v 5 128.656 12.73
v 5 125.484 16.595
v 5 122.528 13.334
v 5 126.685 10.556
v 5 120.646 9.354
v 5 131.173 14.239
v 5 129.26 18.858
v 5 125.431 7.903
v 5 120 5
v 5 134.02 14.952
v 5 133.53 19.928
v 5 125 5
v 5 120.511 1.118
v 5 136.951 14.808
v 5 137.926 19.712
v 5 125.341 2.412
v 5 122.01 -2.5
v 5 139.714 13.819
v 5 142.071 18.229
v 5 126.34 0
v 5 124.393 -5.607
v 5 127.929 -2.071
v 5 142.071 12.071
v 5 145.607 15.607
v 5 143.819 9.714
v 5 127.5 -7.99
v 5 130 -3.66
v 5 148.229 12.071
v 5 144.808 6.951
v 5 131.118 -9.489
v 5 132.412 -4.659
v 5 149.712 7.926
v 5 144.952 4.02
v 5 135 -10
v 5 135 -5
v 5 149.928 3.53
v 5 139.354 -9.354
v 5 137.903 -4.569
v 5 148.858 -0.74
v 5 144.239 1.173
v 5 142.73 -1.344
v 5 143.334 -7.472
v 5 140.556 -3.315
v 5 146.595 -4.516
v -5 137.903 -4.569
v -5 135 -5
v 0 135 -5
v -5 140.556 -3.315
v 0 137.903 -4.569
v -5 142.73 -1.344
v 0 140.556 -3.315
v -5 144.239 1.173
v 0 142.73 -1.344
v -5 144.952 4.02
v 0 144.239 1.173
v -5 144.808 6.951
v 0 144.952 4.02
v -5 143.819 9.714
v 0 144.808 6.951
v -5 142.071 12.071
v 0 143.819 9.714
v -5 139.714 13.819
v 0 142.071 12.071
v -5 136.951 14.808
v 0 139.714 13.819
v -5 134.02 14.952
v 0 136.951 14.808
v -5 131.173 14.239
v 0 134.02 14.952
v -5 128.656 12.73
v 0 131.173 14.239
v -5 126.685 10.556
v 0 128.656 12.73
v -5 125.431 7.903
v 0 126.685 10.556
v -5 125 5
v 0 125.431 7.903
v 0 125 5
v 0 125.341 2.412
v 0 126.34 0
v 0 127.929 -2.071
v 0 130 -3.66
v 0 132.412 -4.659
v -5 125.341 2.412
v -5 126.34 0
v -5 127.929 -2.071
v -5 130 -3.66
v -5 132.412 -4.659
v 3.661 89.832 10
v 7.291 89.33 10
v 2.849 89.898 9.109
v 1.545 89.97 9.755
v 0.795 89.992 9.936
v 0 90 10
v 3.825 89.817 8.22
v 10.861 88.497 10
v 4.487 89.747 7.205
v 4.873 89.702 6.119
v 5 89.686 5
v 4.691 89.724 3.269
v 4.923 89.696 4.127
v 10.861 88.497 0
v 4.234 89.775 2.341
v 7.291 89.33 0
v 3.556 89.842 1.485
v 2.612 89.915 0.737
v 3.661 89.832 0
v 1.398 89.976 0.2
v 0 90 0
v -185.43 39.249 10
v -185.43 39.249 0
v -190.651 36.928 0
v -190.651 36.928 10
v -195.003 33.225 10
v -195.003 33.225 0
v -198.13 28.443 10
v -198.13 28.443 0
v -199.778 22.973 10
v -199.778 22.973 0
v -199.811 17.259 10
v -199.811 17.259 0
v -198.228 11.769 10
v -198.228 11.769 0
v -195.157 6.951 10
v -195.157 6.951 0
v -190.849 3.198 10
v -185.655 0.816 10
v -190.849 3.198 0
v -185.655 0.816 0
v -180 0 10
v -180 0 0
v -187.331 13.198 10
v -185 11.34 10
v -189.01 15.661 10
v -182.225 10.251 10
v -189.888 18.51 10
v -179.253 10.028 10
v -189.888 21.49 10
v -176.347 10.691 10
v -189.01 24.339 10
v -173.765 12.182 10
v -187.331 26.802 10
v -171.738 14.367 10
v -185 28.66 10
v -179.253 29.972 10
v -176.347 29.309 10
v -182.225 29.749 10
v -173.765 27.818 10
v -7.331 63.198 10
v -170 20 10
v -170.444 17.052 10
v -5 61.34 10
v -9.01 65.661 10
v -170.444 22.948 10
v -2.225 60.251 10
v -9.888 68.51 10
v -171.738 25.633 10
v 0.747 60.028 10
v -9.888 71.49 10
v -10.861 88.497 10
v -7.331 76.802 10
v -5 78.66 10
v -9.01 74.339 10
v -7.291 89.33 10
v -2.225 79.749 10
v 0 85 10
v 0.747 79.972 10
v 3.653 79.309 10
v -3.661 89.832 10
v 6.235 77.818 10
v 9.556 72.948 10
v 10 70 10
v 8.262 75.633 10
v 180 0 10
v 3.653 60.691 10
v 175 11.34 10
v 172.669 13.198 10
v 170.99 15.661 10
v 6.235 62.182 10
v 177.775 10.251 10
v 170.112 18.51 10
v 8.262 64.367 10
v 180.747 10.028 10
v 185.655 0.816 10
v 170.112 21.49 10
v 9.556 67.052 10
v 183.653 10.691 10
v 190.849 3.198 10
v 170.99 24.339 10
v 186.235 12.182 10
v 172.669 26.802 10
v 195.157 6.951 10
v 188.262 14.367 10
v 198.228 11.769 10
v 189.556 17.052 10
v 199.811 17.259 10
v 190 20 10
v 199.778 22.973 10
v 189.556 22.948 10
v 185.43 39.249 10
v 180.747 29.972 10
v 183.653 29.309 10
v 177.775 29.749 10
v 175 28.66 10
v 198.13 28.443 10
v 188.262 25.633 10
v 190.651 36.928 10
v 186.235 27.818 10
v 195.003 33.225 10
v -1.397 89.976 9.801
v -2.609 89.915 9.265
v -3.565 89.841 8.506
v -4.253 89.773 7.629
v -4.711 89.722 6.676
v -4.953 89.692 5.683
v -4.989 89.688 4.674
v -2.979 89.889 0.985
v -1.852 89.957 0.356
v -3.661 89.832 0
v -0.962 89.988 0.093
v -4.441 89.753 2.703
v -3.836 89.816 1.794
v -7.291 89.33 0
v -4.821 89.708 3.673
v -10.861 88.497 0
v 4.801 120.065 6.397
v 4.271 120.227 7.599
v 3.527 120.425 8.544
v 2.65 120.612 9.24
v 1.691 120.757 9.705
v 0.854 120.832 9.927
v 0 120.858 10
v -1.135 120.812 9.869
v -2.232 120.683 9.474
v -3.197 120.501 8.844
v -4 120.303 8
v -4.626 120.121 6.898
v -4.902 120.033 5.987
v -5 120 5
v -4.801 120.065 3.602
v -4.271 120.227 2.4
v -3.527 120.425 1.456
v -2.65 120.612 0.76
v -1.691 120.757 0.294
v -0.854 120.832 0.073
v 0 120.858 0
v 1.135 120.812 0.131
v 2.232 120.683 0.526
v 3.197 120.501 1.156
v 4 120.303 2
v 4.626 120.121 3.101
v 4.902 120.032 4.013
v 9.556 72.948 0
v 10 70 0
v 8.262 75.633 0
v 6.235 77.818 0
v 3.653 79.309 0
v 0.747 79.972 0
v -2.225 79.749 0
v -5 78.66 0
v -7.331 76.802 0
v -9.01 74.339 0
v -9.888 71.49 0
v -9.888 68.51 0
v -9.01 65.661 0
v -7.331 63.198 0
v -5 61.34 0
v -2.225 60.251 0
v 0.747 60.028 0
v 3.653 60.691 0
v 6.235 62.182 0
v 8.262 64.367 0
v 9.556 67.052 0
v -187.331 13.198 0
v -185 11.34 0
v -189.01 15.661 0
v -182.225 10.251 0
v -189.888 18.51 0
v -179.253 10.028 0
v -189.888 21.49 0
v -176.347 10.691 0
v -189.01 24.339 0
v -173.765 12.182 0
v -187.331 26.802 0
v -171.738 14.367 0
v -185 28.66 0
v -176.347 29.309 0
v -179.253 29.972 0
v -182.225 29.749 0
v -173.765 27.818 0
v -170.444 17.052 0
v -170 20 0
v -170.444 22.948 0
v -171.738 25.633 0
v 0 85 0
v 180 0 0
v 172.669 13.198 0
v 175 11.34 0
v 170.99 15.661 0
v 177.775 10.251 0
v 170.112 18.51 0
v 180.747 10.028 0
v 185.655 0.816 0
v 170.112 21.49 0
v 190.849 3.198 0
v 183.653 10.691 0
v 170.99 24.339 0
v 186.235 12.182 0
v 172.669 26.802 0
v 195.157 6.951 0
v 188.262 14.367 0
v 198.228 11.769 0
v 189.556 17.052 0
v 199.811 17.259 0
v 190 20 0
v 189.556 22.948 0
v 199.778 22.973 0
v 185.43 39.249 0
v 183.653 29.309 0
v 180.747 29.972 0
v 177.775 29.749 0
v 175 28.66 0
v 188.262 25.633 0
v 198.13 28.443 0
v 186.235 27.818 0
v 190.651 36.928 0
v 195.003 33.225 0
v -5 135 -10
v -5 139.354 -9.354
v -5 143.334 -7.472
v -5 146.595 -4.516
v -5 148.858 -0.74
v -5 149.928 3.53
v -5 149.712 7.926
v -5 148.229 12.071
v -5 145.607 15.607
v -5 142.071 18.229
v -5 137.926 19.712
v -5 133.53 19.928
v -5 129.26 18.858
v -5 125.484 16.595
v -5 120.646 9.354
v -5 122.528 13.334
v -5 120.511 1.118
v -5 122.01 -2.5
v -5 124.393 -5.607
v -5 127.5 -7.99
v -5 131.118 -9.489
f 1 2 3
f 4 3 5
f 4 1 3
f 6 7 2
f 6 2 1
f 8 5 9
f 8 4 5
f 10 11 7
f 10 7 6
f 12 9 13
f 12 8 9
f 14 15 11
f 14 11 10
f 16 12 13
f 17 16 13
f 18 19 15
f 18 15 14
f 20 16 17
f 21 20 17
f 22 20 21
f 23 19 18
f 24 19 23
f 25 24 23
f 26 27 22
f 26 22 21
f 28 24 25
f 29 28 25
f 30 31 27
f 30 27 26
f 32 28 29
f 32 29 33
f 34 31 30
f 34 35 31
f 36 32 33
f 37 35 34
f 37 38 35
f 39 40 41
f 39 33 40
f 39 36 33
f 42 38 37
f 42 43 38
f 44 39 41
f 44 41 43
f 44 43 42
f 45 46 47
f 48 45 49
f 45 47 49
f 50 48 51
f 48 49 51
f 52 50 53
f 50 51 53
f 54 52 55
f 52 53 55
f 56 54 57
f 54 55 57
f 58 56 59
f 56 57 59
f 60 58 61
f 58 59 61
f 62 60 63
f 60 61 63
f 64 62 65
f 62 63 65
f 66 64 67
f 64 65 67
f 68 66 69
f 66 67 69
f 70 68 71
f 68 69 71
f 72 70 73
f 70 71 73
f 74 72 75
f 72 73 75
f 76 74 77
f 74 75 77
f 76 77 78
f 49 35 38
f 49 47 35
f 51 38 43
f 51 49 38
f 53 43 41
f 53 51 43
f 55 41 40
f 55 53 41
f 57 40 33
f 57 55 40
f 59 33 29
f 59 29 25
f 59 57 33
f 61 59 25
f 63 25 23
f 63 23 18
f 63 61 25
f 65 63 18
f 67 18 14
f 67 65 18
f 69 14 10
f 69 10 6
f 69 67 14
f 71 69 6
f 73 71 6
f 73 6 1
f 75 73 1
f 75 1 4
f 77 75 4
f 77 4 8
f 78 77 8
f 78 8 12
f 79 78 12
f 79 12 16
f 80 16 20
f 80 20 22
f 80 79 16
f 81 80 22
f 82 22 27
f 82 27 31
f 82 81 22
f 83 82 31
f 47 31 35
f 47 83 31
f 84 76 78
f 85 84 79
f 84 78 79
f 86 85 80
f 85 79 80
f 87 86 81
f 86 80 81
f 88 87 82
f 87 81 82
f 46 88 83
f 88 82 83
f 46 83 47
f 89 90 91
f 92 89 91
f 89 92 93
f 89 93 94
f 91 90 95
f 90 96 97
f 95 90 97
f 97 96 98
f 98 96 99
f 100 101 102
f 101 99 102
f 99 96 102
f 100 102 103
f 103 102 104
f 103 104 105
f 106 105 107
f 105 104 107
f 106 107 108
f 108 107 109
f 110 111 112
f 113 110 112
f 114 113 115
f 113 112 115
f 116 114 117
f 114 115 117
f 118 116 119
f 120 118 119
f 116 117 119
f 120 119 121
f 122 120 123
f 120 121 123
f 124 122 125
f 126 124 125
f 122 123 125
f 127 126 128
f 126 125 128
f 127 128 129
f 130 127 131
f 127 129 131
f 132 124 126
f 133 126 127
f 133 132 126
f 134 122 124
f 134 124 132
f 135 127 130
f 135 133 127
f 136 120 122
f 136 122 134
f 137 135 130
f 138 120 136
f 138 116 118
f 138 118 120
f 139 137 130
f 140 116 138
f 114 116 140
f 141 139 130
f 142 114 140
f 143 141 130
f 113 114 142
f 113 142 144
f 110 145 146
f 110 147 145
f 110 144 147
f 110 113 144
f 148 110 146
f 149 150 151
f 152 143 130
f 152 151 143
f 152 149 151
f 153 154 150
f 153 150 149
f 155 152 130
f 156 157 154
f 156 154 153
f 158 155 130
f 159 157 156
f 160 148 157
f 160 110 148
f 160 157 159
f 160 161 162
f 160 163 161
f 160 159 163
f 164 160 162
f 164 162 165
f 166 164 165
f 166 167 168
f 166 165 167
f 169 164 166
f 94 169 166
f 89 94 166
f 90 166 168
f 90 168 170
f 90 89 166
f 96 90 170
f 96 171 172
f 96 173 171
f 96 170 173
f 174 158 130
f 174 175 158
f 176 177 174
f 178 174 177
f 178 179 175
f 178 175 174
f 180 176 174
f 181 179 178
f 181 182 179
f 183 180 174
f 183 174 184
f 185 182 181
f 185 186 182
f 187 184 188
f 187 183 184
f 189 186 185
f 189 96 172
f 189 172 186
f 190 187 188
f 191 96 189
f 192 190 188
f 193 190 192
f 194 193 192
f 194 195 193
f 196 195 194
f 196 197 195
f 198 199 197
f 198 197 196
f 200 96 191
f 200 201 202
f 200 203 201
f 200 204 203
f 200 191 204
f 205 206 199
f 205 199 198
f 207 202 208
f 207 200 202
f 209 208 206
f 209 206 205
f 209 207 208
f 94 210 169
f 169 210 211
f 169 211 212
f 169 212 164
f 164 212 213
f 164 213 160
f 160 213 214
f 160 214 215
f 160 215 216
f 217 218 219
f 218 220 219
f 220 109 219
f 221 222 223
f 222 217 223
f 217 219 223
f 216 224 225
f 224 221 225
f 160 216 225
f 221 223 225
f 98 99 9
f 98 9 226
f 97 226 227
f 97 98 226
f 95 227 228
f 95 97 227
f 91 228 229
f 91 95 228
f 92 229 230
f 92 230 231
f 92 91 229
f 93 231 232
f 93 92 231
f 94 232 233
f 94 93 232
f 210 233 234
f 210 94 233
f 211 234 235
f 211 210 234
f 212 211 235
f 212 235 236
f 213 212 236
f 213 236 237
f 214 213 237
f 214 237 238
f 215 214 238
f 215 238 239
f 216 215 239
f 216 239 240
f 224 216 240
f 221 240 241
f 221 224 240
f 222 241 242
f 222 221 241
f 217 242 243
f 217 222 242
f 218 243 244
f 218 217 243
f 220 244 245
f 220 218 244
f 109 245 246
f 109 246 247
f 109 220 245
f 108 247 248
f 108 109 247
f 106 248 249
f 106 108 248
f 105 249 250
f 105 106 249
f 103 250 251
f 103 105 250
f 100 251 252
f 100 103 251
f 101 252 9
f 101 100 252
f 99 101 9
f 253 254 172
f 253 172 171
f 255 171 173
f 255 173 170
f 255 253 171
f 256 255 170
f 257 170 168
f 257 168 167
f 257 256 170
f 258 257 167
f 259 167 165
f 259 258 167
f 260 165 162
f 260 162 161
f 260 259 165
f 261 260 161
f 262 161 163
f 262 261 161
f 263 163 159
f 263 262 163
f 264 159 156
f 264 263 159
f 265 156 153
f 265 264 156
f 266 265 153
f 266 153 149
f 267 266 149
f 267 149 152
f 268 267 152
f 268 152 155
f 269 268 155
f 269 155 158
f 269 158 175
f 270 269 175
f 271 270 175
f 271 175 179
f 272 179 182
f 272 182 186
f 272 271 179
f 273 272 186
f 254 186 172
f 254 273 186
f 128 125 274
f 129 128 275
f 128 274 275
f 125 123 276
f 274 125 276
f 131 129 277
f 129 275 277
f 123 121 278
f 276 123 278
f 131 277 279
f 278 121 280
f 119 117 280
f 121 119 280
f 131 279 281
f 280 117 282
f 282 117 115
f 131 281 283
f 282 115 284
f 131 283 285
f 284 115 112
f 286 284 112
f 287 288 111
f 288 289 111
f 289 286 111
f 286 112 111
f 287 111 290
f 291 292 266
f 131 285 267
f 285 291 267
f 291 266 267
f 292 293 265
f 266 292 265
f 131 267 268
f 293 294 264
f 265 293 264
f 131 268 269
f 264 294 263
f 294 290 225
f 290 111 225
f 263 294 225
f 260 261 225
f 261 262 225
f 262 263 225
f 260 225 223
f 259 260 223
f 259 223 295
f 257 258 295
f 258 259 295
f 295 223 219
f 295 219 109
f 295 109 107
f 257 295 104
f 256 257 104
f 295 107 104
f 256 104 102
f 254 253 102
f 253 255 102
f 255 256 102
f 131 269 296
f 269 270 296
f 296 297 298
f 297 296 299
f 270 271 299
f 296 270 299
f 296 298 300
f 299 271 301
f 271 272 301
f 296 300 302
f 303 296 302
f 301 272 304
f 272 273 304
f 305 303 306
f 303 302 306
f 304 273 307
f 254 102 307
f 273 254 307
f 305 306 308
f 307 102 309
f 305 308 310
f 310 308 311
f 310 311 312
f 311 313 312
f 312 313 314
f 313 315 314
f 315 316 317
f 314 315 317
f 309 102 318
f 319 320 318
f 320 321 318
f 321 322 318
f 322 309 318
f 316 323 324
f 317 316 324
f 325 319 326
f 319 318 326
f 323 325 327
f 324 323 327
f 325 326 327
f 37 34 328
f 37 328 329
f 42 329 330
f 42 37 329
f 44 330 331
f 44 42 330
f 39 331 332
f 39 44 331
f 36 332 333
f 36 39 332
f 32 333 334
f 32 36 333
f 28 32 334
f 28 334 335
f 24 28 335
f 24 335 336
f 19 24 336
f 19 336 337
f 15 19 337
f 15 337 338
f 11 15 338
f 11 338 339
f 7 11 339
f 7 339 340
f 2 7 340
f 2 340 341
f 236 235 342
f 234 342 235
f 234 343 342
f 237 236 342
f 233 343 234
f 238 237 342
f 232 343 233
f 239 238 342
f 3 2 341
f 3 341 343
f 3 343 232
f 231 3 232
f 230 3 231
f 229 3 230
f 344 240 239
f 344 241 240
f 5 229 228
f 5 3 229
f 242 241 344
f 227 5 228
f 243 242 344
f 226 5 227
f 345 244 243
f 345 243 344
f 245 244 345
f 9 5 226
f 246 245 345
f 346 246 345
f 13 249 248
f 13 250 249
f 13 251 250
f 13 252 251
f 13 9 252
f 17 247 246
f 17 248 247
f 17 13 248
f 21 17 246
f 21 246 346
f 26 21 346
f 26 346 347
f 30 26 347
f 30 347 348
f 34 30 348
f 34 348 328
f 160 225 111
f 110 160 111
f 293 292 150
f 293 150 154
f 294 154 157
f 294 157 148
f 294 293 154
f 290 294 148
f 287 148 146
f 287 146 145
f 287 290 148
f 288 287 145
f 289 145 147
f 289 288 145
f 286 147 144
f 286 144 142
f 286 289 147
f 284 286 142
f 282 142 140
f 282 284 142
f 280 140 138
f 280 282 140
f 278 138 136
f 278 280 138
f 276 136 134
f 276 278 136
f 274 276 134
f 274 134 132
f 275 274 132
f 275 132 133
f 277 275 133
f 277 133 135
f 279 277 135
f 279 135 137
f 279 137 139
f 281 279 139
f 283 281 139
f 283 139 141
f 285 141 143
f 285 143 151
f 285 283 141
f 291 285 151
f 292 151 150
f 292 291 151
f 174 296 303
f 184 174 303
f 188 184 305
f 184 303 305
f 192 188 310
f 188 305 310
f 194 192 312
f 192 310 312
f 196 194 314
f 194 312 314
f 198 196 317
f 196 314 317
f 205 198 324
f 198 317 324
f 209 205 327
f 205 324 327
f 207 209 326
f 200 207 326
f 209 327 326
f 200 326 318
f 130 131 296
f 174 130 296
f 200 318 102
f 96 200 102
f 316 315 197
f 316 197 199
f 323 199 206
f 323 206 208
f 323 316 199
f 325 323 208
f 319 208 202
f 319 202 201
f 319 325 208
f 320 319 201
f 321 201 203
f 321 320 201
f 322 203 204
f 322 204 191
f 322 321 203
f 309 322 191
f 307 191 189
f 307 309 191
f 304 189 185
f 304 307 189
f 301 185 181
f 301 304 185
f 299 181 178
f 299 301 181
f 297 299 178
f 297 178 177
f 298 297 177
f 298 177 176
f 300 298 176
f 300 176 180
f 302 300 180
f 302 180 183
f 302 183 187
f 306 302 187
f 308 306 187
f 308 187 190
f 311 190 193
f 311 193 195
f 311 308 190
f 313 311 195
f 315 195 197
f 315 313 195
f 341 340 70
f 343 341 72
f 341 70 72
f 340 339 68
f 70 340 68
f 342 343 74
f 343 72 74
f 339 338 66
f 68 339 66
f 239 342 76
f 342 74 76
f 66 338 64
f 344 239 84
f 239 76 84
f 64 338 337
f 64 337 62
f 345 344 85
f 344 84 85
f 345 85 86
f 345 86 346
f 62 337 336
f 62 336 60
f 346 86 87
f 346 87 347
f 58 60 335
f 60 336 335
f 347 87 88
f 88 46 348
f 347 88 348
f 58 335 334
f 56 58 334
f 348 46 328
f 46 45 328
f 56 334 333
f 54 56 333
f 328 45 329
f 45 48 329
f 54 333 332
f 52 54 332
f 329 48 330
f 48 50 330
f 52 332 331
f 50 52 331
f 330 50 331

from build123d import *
from build123d.topology import SkipClean

# Parameters (mm, degrees)
SKETCH_1_R           = 10
EXTRUDE_1_DEPTH      = 10
EXTRUDE_START        = -85
SKETCH_2_R           = 5
EXTRUDE_2_DEPTH      = 40
EXTRUDE_3_DEPTH      = 5
EXTRUDE_3_DEPTH_BACK = 5
SKETCH_3_R           = 15
SKETCH_3_R_2         = 10


with BuildPart() as part:
    # 草图1 → 凸台-拉伸1 (new body)
    with BuildSketch(Plane.XY):
        with BuildLine():
            Line((-10.860669242, 88.497348787), (-185.430334621, 39.248674393))
            ThreePointArc((-185.430334621, 39.248674393), (-199.8112782, 17.258968065), (-180, 0))
            Line((-180, 0), (180, 0))
            ThreePointArc((180, 0), (199.8112782, 17.258968065), (185.430334621, 39.248674393))
            Line((185.430334621, 39.248674393), (10.860669242, 88.497348787))
            ThreePointArc((10.860669242, 88.497348787), (0, 90), (-10.860669242, 88.497348787))
        make_face()
        with Locations((-180, 20)):
            Circle(SKETCH_1_R, mode=Mode.SUBTRACT)
        with Locations((180, 20)):
            Circle(SKETCH_1_R, mode=Mode.SUBTRACT)
        with Locations((0, 70)):
            Circle(SKETCH_1_R, mode=Mode.SUBTRACT)
    extrude(amount=EXTRUDE_1_DEPTH)

    # 草图2 → 凸台-拉伸2 (add)
    with BuildSketch(Plane.XZ.offset(EXTRUDE_START)):
        with Locations((0, 5)):
            Circle(SKETCH_2_R)
    extrude(amount=-EXTRUDE_2_DEPTH)

    # 草图3 → 凸台-拉伸3 (add, two sides: drawn at the far end of the back side and taken through both)
    with SkipClean():  # the faces are left unmerged after this step: merging them gives an invalid solid
        with BuildSketch(Plane(origin=(0, 0, 0), x_dir=(0, 0, -1), z_dir=(1, 0, 0)).offset(-EXTRUDE_3_DEPTH_BACK)):
            with Locations((-5, 135)):
                Circle(SKETCH_3_R)
            with Locations((-5, 135)):
                Circle(SKETCH_3_R_2, mode=Mode.SUBTRACT)
        extrude(amount=EXTRUDE_3_DEPTH + EXTRUDE_3_DEPTH_BACK)


solid = part.part
